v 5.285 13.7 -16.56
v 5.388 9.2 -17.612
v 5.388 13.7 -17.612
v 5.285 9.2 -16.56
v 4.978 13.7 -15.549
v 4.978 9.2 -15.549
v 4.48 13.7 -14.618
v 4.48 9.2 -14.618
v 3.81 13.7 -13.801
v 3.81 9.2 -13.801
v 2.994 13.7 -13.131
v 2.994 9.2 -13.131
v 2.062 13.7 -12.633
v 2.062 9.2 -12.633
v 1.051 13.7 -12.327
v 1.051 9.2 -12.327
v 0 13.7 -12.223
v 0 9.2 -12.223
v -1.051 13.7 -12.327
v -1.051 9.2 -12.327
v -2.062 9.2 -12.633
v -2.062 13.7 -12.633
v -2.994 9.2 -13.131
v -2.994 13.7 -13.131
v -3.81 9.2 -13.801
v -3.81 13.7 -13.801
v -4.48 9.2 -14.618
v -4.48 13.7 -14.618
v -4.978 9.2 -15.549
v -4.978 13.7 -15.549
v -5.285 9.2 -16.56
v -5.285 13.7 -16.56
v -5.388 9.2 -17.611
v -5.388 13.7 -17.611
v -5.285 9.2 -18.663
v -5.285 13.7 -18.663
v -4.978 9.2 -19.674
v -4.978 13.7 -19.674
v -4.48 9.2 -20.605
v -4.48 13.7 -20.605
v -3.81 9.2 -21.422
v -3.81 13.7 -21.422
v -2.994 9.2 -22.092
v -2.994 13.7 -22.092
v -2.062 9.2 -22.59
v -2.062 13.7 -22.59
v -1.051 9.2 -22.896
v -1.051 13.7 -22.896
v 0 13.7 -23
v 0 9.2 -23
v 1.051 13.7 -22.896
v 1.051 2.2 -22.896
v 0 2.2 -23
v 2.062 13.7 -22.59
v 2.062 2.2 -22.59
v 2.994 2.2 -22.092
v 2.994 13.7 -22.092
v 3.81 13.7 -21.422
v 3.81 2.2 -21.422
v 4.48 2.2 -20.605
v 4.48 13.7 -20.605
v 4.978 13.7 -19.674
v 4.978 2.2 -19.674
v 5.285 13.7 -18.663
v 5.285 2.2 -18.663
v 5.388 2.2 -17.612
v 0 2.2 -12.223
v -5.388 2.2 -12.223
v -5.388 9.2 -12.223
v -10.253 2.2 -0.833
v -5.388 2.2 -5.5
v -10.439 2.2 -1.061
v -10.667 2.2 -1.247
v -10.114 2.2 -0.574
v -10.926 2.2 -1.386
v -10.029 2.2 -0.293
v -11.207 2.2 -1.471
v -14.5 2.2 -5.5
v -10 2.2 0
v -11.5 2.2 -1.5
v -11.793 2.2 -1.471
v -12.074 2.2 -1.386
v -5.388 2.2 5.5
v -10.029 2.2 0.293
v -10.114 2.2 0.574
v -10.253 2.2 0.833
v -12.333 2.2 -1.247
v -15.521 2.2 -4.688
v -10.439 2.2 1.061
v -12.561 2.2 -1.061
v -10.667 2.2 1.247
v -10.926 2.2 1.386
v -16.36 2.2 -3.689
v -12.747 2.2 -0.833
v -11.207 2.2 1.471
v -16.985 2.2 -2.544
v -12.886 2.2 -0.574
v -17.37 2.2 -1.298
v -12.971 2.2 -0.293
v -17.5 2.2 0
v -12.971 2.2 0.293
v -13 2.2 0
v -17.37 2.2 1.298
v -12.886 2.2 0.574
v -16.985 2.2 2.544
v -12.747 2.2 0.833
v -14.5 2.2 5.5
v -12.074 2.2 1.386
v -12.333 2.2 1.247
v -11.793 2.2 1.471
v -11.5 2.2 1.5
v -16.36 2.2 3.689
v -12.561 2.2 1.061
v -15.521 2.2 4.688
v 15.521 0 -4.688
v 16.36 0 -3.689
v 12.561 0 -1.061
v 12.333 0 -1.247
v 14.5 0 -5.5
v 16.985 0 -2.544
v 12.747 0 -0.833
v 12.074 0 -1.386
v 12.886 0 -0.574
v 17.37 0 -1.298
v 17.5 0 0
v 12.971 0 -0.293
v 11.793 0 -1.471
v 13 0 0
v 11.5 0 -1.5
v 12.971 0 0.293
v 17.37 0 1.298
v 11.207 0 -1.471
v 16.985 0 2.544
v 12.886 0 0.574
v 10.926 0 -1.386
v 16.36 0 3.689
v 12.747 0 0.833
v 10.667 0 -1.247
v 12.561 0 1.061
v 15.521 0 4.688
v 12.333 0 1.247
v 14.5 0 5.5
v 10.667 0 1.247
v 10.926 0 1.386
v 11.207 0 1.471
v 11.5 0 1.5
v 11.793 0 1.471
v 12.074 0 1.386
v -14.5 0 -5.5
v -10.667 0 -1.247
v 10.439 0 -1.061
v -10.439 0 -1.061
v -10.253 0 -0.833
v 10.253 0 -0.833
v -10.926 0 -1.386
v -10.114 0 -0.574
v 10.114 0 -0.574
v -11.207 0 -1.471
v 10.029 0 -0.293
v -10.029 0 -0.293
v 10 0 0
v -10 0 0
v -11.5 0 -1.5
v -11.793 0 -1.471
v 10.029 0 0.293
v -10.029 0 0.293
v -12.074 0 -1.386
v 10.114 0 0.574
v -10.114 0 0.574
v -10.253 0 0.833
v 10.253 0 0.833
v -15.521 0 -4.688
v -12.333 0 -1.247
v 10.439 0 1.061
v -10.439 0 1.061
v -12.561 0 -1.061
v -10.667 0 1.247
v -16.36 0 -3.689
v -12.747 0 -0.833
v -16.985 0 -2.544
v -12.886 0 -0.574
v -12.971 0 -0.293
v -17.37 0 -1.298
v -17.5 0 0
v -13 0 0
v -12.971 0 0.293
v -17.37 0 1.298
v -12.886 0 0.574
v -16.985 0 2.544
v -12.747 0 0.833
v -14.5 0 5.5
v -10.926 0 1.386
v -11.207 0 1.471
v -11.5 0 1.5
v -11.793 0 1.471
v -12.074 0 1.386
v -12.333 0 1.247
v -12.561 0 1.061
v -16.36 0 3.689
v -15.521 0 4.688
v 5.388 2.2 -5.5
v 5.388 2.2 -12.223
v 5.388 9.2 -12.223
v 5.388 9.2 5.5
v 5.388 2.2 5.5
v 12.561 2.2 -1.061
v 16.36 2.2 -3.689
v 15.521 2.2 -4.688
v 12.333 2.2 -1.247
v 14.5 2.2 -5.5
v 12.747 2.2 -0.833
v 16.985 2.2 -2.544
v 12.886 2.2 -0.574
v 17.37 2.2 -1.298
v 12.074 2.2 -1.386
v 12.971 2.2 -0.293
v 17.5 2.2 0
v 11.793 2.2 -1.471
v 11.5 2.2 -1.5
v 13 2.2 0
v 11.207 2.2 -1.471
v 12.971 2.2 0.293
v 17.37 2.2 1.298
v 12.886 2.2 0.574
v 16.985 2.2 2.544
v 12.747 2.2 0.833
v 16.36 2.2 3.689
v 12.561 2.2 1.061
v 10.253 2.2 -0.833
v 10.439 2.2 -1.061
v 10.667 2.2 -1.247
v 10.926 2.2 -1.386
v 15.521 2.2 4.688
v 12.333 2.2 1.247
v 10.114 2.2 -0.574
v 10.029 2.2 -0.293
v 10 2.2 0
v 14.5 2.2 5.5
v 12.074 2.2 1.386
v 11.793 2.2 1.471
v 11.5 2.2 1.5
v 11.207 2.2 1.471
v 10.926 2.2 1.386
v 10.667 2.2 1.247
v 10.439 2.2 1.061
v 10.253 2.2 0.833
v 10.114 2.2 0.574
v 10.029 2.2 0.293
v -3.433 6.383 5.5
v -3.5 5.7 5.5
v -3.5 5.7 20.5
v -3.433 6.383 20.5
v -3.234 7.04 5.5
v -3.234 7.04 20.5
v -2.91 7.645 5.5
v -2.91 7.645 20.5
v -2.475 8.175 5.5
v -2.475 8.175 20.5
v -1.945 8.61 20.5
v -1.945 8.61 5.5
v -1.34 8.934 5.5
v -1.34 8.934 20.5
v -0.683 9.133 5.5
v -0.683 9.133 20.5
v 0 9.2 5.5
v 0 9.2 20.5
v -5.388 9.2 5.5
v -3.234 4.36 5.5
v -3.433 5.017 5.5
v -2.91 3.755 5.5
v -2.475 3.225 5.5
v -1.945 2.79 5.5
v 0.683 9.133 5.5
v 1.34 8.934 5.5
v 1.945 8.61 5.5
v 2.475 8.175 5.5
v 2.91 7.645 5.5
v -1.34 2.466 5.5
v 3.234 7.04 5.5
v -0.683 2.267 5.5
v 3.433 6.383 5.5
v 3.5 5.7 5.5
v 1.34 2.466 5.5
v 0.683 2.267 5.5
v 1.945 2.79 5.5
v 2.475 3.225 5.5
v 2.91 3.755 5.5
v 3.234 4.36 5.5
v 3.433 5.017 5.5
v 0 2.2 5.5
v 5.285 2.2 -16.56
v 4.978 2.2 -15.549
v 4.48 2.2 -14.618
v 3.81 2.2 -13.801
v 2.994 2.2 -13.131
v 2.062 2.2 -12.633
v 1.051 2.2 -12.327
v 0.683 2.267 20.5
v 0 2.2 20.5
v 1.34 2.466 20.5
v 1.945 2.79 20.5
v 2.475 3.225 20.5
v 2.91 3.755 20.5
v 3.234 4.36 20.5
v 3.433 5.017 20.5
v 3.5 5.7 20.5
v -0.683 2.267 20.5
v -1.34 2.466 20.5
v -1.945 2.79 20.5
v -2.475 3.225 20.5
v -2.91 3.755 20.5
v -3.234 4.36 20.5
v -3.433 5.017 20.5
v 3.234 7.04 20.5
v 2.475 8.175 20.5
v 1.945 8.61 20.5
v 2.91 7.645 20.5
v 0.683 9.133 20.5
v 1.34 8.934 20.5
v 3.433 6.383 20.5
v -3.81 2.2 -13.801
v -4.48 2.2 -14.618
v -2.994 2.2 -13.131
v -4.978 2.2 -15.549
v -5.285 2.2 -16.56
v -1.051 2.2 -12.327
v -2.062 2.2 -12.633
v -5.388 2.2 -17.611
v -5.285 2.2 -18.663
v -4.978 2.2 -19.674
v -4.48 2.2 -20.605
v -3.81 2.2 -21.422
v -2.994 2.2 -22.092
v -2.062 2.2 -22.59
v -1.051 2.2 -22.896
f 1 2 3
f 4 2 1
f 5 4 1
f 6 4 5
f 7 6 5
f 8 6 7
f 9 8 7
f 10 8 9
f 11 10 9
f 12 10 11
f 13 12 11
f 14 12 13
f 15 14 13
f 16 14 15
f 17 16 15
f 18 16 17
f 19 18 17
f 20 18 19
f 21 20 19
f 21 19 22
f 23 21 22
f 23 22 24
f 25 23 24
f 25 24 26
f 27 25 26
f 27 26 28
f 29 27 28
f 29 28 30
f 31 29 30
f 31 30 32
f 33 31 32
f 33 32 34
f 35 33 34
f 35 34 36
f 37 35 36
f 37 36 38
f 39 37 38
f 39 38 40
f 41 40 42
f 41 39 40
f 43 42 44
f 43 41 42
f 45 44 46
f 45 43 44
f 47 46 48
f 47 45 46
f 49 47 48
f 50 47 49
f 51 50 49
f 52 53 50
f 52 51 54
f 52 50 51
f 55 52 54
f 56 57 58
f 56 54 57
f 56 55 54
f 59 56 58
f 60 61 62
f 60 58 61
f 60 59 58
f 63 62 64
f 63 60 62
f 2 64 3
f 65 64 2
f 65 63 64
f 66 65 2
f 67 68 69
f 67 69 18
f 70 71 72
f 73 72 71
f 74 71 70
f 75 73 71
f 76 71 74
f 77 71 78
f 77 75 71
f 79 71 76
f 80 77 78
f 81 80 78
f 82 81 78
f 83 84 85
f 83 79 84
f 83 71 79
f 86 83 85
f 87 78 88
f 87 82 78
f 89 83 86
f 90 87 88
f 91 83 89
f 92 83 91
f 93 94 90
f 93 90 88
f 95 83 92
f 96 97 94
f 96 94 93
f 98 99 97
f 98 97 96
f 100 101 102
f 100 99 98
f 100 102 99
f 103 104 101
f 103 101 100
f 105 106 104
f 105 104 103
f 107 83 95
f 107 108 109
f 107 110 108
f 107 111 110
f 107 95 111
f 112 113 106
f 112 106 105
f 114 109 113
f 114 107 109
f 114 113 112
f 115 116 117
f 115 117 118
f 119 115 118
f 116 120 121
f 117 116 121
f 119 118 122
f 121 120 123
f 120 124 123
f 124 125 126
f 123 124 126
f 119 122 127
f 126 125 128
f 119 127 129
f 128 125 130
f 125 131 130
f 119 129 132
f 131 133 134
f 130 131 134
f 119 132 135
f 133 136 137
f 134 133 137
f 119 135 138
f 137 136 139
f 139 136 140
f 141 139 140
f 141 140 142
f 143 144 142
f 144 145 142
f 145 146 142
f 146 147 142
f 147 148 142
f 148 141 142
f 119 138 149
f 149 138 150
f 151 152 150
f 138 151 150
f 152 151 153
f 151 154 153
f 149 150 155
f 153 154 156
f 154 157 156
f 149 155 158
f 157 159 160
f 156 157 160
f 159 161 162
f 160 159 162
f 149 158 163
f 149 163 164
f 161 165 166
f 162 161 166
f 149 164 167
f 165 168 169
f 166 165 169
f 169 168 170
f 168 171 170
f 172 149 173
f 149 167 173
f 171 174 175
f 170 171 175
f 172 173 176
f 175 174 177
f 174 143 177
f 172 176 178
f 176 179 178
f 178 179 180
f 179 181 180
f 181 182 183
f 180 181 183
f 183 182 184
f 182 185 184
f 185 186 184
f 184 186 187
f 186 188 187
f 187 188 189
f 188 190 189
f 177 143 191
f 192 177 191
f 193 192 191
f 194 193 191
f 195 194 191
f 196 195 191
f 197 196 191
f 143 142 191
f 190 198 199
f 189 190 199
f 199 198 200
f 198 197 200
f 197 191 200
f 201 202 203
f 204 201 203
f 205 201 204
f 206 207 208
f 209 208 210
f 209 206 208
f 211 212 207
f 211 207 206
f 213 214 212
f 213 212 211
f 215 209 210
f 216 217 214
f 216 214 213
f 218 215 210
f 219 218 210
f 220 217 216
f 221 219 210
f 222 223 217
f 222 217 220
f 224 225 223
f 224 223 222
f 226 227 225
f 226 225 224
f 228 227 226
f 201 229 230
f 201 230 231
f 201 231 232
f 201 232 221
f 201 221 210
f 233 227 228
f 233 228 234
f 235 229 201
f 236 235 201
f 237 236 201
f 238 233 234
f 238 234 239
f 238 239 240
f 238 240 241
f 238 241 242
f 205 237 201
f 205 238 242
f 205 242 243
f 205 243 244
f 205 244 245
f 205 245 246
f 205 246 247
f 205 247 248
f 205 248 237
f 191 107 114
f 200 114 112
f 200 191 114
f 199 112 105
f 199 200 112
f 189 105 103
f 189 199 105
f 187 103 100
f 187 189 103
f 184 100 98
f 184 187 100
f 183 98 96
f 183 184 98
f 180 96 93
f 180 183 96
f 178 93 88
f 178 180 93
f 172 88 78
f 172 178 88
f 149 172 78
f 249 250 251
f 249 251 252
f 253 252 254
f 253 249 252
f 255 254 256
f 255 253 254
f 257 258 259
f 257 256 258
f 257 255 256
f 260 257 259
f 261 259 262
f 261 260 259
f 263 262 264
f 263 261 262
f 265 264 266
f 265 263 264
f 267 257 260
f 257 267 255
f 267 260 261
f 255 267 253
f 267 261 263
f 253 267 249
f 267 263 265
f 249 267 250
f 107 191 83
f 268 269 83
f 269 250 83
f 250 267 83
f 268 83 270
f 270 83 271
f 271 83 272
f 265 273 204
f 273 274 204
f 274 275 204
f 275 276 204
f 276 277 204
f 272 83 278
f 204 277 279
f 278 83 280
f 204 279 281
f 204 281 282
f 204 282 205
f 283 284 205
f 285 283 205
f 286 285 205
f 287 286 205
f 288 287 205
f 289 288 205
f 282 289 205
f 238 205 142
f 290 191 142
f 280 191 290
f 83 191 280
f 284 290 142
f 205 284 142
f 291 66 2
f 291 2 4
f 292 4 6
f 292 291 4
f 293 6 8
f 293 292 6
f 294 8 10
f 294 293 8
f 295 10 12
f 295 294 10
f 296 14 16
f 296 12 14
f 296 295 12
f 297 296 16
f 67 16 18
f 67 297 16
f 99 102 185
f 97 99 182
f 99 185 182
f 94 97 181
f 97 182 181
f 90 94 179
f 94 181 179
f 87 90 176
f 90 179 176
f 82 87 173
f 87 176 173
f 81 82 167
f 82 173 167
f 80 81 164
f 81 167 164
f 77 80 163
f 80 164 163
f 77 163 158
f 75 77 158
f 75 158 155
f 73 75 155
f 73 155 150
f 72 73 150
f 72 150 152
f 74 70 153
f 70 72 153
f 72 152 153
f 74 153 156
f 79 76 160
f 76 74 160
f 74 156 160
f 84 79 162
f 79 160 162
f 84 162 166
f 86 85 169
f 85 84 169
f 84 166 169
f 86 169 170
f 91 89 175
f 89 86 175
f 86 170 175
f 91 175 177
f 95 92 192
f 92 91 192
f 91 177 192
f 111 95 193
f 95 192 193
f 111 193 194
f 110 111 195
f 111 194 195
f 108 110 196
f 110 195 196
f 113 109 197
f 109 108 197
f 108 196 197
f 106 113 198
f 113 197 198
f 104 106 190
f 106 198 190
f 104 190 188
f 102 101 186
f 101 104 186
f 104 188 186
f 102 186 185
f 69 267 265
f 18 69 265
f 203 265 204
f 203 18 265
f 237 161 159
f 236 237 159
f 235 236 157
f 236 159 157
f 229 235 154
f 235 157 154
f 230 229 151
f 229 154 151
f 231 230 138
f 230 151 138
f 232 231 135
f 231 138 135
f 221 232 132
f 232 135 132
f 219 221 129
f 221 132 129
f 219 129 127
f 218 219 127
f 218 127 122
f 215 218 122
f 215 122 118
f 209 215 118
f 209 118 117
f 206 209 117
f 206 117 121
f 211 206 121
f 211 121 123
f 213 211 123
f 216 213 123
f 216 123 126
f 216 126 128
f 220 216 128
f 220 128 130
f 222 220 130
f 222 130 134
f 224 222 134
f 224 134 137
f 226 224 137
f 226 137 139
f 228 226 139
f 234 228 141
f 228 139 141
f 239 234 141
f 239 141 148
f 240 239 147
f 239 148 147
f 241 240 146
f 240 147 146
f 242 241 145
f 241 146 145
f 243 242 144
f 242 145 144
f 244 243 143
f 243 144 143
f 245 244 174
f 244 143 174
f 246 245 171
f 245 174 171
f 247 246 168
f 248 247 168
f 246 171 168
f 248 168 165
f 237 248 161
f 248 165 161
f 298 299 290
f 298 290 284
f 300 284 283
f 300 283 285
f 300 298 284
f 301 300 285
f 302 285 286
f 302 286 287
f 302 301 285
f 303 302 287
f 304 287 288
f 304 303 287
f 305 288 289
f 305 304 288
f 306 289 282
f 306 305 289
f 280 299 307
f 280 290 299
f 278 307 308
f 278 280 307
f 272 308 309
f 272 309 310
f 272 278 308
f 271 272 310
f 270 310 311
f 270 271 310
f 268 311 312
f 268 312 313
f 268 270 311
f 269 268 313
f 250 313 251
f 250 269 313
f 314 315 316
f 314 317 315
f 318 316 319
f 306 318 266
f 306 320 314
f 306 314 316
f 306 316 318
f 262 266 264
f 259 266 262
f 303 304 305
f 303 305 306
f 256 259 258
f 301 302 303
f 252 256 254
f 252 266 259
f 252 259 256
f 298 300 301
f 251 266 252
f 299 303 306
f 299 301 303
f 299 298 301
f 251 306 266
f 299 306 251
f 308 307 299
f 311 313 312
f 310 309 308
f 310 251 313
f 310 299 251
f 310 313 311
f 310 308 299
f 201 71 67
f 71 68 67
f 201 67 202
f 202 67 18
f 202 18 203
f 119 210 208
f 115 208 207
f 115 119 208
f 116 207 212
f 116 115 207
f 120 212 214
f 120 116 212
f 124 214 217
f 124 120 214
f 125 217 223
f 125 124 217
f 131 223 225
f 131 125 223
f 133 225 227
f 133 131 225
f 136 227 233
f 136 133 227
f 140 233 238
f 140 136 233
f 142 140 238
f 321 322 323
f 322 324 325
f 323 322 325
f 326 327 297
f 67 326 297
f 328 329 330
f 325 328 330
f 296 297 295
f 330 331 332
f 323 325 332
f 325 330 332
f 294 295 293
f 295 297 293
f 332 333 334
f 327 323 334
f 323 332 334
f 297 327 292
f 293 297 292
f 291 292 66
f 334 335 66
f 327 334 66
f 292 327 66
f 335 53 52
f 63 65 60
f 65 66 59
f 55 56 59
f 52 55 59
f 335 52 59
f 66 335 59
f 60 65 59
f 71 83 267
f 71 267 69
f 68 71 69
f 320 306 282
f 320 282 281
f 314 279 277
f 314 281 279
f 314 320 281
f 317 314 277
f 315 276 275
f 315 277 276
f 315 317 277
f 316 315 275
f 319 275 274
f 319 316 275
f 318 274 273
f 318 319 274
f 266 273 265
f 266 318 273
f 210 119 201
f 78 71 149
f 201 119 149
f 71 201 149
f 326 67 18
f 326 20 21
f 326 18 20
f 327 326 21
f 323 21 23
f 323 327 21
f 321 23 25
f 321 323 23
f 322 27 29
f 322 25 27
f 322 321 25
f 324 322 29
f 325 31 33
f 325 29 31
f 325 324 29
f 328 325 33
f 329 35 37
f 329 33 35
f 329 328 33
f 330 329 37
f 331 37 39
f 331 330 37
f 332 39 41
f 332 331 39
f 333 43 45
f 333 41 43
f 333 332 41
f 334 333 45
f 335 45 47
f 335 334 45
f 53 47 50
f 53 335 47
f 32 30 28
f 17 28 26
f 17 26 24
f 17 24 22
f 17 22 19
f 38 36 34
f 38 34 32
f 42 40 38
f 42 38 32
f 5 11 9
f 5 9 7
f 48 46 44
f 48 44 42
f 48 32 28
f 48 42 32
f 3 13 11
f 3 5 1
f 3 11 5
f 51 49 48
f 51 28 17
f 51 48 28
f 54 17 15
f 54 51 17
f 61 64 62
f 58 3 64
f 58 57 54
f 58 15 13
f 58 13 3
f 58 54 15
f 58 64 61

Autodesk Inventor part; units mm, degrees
ref_plane "YZ Plane" through (0, 0, 0) normal (1, 0, 0) x (0, 1, 0)
ref_plane "XZ Plane" through (0, 0, 0) normal (0, 1, 0) x (-1, 0, 0)
ref_plane "XY Plane" through (0, 0, 0) normal (0, 0, 1) x (1, 0, 0)
sketch "Boceto1" plane through (0, 0, 0) normal (0, 1, 0) x (-1, 0, 0)
  line L0 (11.5, 5.5) -> (-11.5, 5.5)
  line L1 (-11.5, 5.5) -> (-11.5, -5.5)
  line L2 (-11.5, -5.5) -> (11.5, -5.5)
  line L3 (11.5, -5.5) -> (11.5, 5.5)
  line L4 (0, 0) -> (0, -30.7966)
  line L5 (0, 0) -> (-20.4633, 0)
  circle A0 centre (11.5, 0) radius 1.5
  circle A1 centre (-11.5, 0) radius 1.5
  line L6 (11.5, 5.5) -> (17.5, 5.5)
  line L7 (17.5, 5.5) -> (17.5, -5.5)
  line L8 (17.5, -5.5) -> (11.5, -5.5)
  line L9 (-11.5, -5.5) -> (-17.5, -5.5)
  line L10 (-17.5, -5.5) -> (-17.5, 5.5)
  line L11 (-17.5, 5.5) -> (-11.5, 5.5)
  arc A2 (14.5, -5.5) -> (14.5, 5.5) centre (10.9583, 0) ccw
  arc A3 (-14.5, 5.5) -> (-14.5, -5.5) centre (-10.9583, 0) ccw
  point P0 (0, -5.5)
  dimension "d0" = 23
  dimension "d1" = 11
  dimension "d2" = 3
  dimension "d3" = 3
  dimension "d4" = 35
extrude "Extrusión1" add sketch "Boceto1" along normal blind 2.2 contours L3 A0 L2 L4 L5 A1 L1 L0 | L6 A2 L8 L3 A0 | L1 A1 L5 A3 L11 | L5 L4 L2 L1 A1 | A1 L1 L9 A3 L5
sketch "Boceto2" plane through (0, 2.2, 0) normal (0, 1, 0) x (1, 0, 0)
  line L0 (-5.3885, 12.2229) -> (5.3885, 12.2229)
  line L1 (5.3885, 12.2229) -> (5.3885, -5.5)
  line L2 (5.3885, -5.5) -> (-5.3885, -5.5)
  line L3 (-5.3885, -5.5) -> (-5.3885, 12.2229)
  line L4 (-14.5, -5.5) -> (14.5, -5.5) projected
  line L5 (-3.5, -5.5) -> (3.5, -5.5)
  line L6 (3.5, -5.5) -> (3.5, -20.5)
  line L7 (3.5, -20.5) -> (-3.5, -20.5)
  line L8 (-3.5, -20.5) -> (-3.5, -5.5)
  circle A0 centre (0, 17.6115) radius 5.3885
  line L9 (-5.3885, 12.2229) -> (-5.3885, 43.935) construction
  line L10 (5.3885, 12.2229) -> (5.3885, 43.935) construction
  line L11 (0, 23) -> (-9.6882, 23)
  point P0 (0, 0)
  point P1 (0, -5.5)
  point P2 (0, -5.5)
  point P3 (0, 12.2229)
  dimension "d7" = 7
  dimension "d8" = 20.5
  dimension "d9" = 43.5
extrude "Extrusión2" add sketch "Boceto2" along normal blind 7
fillet "Empalme1" radius 3.5 4 edges at (3.5, 9.2, 13) (-3.5, 9.2, 13) (3.5, 2.2, 13) (-3.5, 2.2, 13)
sketch "Boceto3" plane through (0, 9.2, -17.6115) normal (0, 1, 0) x (1, 0, 0)
  circle A0 centre (0, 0) radius 5.3885 projected
  point P0 (0, -17.6115)
  point P1 (0, -5.3885)
extrude "Extrusión3" add sketch "Boceto3" along normal blind 4.5
properties part number "Latch"
